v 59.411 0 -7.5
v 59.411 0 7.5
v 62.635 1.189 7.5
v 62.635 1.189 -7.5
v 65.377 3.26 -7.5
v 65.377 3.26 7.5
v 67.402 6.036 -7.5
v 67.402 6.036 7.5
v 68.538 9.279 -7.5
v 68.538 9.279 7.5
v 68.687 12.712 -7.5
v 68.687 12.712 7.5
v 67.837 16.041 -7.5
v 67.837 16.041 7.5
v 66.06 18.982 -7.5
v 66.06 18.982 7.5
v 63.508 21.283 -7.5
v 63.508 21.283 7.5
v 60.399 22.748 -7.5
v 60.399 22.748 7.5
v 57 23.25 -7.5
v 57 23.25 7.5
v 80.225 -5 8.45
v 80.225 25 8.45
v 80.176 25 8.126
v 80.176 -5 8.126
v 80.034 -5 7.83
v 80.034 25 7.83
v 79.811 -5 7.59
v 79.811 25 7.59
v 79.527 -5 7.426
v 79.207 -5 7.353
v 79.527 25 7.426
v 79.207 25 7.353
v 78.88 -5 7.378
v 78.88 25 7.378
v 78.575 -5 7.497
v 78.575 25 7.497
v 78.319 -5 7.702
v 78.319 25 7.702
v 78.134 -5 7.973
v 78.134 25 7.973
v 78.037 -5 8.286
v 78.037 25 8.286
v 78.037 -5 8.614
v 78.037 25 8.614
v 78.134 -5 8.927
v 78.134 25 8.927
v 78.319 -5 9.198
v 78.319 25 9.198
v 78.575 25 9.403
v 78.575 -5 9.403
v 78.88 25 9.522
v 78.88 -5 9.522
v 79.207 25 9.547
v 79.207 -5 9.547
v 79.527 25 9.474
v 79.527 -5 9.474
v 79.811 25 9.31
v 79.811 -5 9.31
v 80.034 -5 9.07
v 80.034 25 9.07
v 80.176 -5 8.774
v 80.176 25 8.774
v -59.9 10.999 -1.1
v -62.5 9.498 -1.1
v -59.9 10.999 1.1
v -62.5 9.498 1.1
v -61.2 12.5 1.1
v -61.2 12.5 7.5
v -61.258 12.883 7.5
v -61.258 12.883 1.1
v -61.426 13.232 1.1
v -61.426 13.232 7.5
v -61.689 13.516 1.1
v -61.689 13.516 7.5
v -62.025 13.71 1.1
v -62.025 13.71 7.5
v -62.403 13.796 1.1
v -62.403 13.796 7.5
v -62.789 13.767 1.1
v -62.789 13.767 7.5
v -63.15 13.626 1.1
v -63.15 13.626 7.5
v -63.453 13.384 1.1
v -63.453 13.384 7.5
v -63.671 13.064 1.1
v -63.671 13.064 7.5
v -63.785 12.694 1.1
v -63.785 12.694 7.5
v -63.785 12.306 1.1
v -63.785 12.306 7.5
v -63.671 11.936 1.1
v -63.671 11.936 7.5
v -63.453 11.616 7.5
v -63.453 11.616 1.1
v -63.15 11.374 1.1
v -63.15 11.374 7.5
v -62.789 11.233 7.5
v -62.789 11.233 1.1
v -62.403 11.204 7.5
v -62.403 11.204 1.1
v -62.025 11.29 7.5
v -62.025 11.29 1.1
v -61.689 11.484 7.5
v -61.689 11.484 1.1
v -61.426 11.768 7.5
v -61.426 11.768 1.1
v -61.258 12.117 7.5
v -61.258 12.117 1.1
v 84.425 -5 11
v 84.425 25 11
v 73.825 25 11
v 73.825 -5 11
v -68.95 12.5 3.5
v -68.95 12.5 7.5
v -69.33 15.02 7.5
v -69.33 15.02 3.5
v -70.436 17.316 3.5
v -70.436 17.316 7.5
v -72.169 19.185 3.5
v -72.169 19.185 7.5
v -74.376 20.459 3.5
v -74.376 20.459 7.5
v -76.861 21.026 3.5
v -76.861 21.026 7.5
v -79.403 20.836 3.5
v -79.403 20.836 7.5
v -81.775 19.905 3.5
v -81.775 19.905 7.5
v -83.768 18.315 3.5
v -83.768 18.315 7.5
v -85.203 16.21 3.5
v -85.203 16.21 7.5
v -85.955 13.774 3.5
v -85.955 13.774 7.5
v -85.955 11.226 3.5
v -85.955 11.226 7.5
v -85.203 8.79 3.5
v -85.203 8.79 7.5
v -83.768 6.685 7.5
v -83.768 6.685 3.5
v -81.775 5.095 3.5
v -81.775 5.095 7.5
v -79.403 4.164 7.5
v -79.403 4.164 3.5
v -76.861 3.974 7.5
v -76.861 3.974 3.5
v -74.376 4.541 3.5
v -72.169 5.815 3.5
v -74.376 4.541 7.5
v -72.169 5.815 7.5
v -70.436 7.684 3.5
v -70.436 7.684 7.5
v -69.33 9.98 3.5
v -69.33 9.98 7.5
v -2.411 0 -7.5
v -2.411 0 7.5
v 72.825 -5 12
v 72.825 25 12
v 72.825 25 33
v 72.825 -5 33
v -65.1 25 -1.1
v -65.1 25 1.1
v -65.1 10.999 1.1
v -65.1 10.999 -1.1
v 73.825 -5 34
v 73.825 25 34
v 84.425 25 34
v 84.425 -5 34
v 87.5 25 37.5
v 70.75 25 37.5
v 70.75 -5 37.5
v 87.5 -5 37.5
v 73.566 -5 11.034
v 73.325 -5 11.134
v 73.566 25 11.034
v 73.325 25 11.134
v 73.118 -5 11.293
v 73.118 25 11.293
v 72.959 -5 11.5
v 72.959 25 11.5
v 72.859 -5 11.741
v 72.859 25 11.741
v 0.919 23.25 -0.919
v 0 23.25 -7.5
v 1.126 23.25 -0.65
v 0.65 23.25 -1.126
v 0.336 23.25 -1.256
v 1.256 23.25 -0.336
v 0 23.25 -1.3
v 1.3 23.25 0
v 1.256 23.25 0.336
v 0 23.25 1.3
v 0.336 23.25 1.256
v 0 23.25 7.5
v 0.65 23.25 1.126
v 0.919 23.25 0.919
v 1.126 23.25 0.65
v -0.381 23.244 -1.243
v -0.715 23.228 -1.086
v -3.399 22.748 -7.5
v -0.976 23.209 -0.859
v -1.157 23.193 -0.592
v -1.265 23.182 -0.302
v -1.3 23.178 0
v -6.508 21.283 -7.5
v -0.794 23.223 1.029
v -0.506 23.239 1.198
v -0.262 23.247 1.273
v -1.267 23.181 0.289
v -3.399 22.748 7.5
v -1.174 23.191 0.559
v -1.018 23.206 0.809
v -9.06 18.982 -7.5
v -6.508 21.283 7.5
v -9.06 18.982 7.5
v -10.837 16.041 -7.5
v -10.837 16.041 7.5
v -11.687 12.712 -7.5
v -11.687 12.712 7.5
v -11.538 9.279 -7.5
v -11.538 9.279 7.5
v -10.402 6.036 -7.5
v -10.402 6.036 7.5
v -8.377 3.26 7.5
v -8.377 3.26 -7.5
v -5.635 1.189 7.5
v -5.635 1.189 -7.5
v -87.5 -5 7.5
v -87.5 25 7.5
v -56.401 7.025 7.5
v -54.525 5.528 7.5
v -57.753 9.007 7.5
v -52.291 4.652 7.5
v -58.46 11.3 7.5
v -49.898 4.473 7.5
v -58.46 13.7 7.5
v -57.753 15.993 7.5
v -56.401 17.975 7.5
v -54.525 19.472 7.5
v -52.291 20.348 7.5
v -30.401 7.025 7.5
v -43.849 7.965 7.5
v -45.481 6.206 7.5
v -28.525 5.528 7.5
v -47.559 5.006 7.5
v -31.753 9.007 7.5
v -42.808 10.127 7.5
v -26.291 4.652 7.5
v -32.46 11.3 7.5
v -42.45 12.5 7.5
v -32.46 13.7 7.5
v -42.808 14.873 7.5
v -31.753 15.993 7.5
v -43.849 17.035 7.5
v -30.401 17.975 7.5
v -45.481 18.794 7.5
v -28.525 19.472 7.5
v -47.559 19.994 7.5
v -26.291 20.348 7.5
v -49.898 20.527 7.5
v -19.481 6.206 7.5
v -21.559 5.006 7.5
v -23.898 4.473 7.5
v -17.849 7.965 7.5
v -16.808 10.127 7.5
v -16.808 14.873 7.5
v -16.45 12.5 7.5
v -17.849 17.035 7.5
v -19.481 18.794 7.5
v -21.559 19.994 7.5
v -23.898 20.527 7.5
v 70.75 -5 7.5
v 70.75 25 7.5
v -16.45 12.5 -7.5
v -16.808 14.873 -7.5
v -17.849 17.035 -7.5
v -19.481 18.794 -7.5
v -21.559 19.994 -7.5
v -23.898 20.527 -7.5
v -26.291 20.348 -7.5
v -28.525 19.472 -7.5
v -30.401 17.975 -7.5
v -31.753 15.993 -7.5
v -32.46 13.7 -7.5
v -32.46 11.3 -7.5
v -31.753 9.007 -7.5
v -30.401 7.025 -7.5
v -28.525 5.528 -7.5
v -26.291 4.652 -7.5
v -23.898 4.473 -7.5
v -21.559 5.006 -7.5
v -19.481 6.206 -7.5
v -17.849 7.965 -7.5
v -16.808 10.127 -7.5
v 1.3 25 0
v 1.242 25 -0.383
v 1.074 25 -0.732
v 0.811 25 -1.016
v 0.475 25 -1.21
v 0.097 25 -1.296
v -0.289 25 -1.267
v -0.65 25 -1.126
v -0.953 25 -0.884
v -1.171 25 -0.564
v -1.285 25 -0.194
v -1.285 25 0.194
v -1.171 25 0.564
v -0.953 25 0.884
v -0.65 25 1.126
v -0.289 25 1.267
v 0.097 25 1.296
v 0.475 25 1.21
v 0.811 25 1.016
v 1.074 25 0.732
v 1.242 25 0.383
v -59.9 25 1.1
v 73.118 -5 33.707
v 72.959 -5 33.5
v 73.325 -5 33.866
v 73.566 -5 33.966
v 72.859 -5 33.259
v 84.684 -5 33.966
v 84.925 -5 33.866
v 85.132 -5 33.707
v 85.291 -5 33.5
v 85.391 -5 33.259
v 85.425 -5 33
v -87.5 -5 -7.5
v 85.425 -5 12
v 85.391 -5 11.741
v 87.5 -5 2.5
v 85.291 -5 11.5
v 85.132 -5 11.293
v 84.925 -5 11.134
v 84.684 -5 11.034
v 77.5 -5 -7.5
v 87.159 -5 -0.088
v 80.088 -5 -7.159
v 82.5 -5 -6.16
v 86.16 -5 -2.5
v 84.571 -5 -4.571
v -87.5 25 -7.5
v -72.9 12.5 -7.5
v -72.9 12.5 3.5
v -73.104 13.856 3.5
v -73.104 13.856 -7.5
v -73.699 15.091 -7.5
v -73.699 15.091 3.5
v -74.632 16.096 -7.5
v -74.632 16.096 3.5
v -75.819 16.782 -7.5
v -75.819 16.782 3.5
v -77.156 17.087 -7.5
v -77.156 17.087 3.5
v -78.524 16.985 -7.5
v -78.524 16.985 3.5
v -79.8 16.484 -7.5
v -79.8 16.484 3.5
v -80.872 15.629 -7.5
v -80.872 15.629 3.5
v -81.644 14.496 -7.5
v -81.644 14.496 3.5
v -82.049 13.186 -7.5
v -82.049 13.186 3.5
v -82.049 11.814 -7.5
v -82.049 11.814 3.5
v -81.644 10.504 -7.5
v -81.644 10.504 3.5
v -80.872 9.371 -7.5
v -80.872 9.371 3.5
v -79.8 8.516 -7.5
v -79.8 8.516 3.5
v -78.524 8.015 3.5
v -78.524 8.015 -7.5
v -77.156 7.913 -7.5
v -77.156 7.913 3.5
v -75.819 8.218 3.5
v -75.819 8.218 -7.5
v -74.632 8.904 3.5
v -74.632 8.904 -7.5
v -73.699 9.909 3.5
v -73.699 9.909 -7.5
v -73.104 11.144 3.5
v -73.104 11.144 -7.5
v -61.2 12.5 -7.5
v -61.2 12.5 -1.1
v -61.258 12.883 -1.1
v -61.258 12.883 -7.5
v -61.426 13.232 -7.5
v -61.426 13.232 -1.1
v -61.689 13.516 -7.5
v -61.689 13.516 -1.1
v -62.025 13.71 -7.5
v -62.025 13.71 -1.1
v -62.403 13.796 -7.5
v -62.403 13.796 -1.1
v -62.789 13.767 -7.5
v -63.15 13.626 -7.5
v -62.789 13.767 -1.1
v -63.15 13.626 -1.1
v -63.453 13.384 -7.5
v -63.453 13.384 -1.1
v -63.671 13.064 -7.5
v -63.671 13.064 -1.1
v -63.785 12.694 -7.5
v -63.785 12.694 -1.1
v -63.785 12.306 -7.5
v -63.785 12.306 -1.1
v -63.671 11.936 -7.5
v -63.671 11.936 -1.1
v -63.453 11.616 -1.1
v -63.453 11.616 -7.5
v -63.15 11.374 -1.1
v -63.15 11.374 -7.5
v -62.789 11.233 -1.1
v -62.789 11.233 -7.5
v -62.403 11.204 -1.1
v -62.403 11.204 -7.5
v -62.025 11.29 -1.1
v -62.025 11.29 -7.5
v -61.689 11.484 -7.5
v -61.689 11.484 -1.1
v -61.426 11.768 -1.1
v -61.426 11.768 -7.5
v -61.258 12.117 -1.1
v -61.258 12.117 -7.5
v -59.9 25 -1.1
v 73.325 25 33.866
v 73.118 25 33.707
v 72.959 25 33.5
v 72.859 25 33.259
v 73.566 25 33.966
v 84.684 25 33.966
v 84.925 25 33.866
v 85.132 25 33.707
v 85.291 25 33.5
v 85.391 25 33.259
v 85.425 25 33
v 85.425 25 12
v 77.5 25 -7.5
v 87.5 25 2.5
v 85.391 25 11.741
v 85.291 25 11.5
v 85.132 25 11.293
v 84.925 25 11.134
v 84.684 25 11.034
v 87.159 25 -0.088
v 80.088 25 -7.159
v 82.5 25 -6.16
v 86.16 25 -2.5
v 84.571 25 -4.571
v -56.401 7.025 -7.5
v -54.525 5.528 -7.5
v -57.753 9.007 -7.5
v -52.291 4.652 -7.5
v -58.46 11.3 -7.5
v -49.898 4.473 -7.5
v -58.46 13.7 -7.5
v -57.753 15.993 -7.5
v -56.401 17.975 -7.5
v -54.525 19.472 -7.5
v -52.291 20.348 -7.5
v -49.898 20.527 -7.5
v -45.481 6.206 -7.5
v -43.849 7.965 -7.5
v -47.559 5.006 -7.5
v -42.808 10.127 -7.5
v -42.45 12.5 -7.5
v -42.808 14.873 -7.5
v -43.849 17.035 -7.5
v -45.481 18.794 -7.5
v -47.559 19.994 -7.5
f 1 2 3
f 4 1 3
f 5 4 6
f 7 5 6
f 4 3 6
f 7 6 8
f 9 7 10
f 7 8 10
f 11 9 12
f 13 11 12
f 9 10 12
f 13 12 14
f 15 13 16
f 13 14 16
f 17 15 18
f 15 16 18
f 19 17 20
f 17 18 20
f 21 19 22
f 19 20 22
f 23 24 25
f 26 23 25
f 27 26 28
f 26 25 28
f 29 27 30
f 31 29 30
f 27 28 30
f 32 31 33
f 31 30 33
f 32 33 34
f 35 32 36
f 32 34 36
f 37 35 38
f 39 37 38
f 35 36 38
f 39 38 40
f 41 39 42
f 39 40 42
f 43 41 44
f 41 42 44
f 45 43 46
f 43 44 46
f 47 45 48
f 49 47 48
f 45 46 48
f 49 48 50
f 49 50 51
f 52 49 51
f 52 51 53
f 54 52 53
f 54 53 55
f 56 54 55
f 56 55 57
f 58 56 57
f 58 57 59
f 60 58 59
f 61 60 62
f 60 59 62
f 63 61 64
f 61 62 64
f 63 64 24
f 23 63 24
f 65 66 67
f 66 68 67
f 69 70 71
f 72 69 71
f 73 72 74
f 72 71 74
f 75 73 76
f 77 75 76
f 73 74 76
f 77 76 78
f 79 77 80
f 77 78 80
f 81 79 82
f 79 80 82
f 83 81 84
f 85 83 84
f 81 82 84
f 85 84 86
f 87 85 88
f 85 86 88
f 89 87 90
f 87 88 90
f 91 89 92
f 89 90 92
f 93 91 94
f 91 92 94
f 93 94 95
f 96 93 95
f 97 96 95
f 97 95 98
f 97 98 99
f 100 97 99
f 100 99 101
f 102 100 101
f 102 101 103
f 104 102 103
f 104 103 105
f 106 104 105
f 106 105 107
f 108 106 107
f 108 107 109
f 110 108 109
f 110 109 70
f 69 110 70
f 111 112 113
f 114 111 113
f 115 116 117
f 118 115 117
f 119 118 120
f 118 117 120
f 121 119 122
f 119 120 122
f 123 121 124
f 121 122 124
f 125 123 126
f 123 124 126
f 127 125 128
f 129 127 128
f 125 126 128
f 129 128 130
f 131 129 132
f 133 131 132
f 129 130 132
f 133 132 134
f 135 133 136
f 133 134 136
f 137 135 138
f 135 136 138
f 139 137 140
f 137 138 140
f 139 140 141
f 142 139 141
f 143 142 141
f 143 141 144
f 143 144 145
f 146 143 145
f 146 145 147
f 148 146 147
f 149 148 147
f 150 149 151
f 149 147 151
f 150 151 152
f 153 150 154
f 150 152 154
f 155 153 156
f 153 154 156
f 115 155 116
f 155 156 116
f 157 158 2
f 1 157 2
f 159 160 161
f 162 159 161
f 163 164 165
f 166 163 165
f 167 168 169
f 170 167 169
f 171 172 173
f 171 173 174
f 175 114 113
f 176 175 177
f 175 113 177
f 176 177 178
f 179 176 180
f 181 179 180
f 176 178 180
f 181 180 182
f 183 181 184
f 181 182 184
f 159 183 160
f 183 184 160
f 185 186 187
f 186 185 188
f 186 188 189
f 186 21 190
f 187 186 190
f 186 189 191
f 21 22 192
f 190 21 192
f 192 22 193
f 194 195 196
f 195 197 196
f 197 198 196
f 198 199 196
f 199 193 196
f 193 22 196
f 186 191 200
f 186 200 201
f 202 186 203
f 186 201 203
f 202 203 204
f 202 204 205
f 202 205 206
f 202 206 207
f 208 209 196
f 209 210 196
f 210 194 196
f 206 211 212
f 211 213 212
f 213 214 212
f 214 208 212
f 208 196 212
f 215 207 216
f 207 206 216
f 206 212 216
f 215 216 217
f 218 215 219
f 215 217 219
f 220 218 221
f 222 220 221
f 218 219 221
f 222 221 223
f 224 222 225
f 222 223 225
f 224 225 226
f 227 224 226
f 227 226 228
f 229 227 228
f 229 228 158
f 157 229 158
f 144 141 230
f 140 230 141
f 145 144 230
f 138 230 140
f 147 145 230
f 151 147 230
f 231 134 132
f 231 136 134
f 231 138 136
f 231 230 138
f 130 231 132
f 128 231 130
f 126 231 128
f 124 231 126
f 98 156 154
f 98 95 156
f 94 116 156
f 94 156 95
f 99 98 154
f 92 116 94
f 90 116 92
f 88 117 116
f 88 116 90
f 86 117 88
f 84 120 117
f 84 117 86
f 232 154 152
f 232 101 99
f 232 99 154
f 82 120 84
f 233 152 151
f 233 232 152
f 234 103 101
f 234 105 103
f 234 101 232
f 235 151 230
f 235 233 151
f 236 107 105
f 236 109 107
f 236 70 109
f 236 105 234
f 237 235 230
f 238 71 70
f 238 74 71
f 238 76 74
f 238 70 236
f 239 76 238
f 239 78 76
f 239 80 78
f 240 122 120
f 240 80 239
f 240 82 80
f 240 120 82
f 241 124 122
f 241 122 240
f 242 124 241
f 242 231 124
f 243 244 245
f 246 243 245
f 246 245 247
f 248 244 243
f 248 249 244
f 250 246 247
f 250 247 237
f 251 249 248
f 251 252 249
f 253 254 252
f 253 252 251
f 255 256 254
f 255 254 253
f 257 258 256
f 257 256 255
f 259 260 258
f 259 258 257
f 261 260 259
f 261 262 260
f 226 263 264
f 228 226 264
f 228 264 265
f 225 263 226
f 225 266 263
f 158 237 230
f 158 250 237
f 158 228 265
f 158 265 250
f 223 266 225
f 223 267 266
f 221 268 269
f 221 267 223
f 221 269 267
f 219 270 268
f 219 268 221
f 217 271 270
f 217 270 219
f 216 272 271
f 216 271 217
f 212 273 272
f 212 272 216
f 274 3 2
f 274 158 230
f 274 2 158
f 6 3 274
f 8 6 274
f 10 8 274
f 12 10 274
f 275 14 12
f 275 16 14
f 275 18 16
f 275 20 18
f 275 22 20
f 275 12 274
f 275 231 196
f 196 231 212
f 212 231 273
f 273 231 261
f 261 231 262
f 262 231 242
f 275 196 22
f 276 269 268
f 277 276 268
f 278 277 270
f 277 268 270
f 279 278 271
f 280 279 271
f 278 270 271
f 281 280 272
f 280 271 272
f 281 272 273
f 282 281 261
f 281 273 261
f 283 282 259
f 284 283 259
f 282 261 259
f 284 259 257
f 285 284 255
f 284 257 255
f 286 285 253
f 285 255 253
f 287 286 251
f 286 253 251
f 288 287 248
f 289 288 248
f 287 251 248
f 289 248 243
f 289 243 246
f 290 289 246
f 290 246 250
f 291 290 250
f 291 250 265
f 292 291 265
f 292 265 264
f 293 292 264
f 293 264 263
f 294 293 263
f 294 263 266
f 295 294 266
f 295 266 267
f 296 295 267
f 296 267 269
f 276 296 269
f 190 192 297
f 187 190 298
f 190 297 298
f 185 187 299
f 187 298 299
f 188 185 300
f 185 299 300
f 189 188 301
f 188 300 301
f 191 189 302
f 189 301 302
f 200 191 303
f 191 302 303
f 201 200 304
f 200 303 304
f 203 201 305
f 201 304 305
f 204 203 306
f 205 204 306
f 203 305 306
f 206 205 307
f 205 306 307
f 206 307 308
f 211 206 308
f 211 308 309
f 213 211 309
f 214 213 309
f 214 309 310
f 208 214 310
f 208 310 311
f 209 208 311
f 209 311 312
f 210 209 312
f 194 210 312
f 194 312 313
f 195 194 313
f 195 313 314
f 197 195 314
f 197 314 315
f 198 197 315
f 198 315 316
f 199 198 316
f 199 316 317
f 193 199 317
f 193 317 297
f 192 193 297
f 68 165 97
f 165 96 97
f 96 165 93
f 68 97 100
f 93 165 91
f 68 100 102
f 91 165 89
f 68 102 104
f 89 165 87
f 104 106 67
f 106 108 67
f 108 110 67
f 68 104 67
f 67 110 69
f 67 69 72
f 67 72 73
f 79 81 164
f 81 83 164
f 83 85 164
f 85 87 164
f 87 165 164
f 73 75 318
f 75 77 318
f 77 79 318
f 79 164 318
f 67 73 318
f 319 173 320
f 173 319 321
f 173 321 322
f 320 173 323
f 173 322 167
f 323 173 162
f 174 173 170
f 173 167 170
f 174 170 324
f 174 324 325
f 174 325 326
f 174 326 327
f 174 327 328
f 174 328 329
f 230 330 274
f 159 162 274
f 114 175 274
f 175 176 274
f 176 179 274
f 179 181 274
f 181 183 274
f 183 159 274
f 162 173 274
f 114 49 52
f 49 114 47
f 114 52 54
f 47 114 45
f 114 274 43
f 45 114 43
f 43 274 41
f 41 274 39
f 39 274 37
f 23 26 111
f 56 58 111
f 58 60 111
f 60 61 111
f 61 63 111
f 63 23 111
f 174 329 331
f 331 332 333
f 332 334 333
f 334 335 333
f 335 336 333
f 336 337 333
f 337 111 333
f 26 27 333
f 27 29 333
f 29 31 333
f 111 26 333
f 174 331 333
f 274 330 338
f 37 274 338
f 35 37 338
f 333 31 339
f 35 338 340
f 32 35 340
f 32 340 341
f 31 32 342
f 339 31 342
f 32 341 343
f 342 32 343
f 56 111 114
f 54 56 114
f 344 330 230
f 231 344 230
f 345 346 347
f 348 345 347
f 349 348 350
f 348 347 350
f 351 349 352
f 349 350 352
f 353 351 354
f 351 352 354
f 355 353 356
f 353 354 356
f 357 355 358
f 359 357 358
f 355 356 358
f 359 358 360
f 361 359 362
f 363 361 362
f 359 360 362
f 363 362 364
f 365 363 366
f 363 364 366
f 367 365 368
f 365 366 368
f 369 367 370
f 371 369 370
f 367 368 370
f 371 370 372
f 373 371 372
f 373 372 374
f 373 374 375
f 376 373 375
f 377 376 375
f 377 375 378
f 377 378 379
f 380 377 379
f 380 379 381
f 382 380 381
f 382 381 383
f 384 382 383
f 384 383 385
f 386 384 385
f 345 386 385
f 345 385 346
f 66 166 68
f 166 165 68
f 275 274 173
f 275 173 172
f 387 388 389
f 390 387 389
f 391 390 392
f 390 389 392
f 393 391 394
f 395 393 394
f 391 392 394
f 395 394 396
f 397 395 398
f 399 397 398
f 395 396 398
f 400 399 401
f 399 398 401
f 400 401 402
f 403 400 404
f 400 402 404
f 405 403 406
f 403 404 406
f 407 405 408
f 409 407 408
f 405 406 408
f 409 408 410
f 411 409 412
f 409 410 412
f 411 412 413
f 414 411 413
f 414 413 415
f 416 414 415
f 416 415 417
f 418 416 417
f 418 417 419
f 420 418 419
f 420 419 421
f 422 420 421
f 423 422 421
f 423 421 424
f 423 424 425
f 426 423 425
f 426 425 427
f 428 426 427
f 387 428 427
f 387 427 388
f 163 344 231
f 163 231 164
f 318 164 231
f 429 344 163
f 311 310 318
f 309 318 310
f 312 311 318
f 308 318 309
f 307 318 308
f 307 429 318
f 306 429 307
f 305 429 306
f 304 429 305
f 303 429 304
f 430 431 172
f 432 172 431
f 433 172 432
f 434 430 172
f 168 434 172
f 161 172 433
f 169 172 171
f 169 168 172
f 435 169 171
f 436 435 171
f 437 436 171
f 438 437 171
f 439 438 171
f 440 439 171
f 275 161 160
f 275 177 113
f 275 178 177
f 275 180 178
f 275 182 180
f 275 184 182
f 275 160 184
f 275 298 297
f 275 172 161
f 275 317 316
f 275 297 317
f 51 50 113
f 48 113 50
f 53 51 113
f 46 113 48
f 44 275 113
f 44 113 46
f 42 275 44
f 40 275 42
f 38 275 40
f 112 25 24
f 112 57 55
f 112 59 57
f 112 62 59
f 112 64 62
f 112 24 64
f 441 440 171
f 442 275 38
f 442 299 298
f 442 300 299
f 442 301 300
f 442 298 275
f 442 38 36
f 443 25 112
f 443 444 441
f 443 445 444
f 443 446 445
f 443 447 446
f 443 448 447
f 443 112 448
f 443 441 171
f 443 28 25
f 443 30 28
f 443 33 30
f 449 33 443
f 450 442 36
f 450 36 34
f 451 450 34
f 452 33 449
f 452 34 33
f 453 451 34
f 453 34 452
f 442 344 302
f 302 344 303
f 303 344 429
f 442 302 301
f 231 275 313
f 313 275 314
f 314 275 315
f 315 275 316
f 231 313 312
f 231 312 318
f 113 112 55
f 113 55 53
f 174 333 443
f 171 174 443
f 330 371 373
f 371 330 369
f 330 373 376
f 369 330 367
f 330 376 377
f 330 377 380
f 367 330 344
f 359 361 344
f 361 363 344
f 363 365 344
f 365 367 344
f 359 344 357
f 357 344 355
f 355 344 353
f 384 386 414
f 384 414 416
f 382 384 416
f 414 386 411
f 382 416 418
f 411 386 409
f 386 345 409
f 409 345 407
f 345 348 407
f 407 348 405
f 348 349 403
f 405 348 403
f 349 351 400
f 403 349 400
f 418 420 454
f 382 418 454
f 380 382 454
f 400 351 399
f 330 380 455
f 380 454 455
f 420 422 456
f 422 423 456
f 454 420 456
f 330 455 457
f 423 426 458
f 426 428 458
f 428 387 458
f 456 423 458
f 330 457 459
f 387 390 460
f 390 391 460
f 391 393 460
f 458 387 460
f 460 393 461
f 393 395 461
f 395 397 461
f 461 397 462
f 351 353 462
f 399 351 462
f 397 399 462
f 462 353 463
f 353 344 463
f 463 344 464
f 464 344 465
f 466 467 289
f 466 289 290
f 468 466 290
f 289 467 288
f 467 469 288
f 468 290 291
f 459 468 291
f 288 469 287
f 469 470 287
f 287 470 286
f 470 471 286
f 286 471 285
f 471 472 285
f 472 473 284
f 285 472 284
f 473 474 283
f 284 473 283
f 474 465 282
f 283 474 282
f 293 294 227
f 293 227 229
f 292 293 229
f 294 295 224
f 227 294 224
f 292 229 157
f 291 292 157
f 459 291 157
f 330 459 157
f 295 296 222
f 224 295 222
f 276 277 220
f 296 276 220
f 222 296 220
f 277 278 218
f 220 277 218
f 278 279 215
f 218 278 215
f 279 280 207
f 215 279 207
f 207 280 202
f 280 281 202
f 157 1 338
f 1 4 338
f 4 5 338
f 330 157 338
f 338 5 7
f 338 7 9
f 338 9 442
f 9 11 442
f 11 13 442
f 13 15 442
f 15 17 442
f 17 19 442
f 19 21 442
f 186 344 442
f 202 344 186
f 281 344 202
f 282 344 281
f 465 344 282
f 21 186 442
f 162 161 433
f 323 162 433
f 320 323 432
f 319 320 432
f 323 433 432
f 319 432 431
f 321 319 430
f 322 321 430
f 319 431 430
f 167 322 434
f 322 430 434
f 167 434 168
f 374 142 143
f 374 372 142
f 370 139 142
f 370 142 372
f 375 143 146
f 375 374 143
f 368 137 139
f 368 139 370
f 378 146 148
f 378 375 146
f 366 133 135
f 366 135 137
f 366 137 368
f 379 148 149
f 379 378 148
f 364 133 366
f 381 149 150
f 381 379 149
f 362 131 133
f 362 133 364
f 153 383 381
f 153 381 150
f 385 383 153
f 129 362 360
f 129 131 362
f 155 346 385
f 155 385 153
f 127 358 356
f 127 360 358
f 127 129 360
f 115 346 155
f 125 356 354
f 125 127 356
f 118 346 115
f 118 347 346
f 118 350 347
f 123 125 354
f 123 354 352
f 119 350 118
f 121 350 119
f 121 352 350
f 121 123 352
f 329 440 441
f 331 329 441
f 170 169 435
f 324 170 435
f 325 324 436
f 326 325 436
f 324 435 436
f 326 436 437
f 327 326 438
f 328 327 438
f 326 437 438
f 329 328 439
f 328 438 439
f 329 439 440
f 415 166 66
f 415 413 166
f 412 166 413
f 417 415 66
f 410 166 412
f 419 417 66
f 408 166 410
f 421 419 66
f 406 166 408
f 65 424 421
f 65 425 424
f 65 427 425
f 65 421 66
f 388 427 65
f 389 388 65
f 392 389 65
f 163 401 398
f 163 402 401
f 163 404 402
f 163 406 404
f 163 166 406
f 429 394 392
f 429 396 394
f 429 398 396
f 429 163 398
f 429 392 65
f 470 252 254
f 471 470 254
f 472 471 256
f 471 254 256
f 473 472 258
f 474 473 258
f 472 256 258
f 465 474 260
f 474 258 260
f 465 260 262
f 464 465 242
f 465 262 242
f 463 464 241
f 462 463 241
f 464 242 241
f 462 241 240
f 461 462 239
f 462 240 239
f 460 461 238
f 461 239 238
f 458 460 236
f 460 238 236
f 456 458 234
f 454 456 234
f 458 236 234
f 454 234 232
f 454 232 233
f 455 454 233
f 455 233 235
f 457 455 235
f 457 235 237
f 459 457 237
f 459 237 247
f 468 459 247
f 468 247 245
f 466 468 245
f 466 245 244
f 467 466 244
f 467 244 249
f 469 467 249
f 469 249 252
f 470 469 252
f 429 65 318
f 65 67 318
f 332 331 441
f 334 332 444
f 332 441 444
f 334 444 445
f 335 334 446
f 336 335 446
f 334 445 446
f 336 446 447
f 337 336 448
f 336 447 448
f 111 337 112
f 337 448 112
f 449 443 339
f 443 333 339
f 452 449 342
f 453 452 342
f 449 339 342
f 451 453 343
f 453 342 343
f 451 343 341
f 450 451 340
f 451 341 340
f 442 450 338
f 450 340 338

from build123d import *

# Parameters (mm, degrees)
SKETCH1_W           = 175
SKETCH1_H           = 15
BOSS_EXTRUDE1_DEPTH = 25
CUT_EXTRUDE1_REACH  = 17
SKETCH3_R           = 4.6
SKETCH3_R_2         = 8.05
SKETCH3_R_3         = 1.3
SKETCH3_3_R         = 8.55
SKETCH3_3_R_2       = 4.6
CUT_EXTRUDE2_DEPTH  = 4
CUT_EXTRUDE3_DEPTH  = 1.1
CUT_EXTRUDE4_REACH  = 27
SKETCH5_R           = 1.3
CUT_EXTRUDE6_REACH  = 17
SKETCH8_W           = 175
SKETCH8_H           = 15
BOSS_EXTRUDE2_DEPTH = 5
SKETCH9_W           = 16.75
SKETCH9_H           = 30
BOSS_EXTRUDE3_DEPTH = 30
SKETCH10_R          = 1.1
CUT_EXTRUDE7_DEPTH  = 30
FILLET1_R           = 10


with BuildPart() as part:
    # Sketch1 → Boss-Extrude1 (new body)
    with BuildSketch(Plane(origin=(0, 0, 0), x_dir=(1, 0, 0), z_dir=(0, 1, 0))):
        Rectangle(SKETCH1_W, SKETCH1_H)
    extrude(amount=BOSS_EXTRUDE1_DEPTH)

    # Sketch3 → Cut-Extrude1 (cut, up to next)
    with BuildSketch(Plane.XY.offset(7.5), mode=Mode.PRIVATE) as cut_extrude1_sk1:
        with Locations((-77.5, 12.5)):
            Circle(SKETCH3_R)
    cut_extrude1_tool1 = extrude(cut_extrude1_sk1.sketch, amount=-CUT_EXTRUDE1_REACH, mode=Mode.PRIVATE) & part.part
    add(cut_extrude1_tool1.solids().sort_by_distance((-77.5, 12.5, 7.5))[0], mode=Mode.SUBTRACT)
    # Sketch3 → Cut-Extrude1 (cut, up to next)
    with BuildSketch(Plane.XY.offset(7.5), mode=Mode.PRIVATE) as cut_extrude1_sk2:
        with Locations((-50.5, 12.5)):
            Circle(SKETCH3_R_2)
    cut_extrude1_tool2 = extrude(cut_extrude1_sk2.sketch, amount=-CUT_EXTRUDE1_REACH, mode=Mode.PRIVATE) & part.part
    add(cut_extrude1_tool2.solids().sort_by_distance((-50.5, 12.5, 7.5))[0], mode=Mode.SUBTRACT)
    # Sketch3 → Cut-Extrude1 (cut, up to next)
    with BuildSketch(Plane.XY.offset(7.5), mode=Mode.PRIVATE) as cut_extrude1_sk3:
        with Locations((-24.5, 12.5)):
            Circle(SKETCH3_R_2)
    cut_extrude1_tool3 = extrude(cut_extrude1_sk3.sketch, amount=-CUT_EXTRUDE1_REACH, mode=Mode.PRIVATE) & part.part
    add(cut_extrude1_tool3.solids().sort_by_distance((-24.5, 12.5, 7.5))[0], mode=Mode.SUBTRACT)
    # Sketch3 → Cut-Extrude1 (cut, up to next)
    with BuildSketch(Plane.XY.offset(7.5), mode=Mode.PRIVATE) as cut_extrude1_sk4:
        with Locations((-62.5, 12.5)):
            Circle(SKETCH3_R_3)
    cut_extrude1_tool4 = extrude(cut_extrude1_sk4.sketch, amount=-CUT_EXTRUDE1_REACH, mode=Mode.PRIVATE) & part.part
    add(cut_extrude1_tool4.solids().sort_by_distance((-62.5, 12.5, 7.5))[0], mode=Mode.SUBTRACT)

    # Sketch3<3> → Cut-Extrude2 (cut)
    with BuildSketch(Plane.XY.offset(7.5)):
        with Locations((-77.5, 12.5)):
            Circle(SKETCH3_3_R)
        with Locations((-77.5, 12.5)):
            Circle(SKETCH3_3_R_2, mode=Mode.SUBTRACT)
    extrude(amount=-CUT_EXTRUDE2_DEPTH, mode=Mode.SUBTRACT)

    # Sketch4 → Cut-Extrude3 (cut, symmetric)
    with BuildSketch(Plane.XY):
        Polygon((-59.9, 10.9988893), (-59.9, 14.0011107), (-62.5, 15.5022214), (-65.1, 14.0011107), (-65.1, 10.9988893), (-62.5, 9.4977786), align=None)
        Polygon((-59.9, 25), (-59.9, 14.0011107), (-62.5, 15.5022214), (-65.1, 14.0011107), (-65.1, 25), align=None)
    extrude(amount=CUT_EXTRUDE3_DEPTH, both=True, mode=Mode.SUBTRACT)

    # Sketch5 → Cut-Extrude4 (cut, up to next)
    with BuildSketch(Plane(origin=(0, 25, 0), x_dir=(1, 0, 0), z_dir=(0, 1, 0)), mode=Mode.PRIVATE) as cut_extrude4_sk1:
        Circle(SKETCH5_R)
    cut_extrude4_tool1 = extrude(cut_extrude4_sk1.sketch, amount=-CUT_EXTRUDE4_REACH, mode=Mode.PRIVATE) & part.part
    add(cut_extrude4_tool1.solids().sort_by_distance((0, 25, 0))[0], mode=Mode.SUBTRACT)

    # Sketch6 → Cut-Extrude6 (cut, up to next)
    with BuildSketch(Plane.XY.offset(7.5), mode=Mode.PRIVATE) as cut_extrude6_sk1:
        with BuildLine():
            Line((57, 23), (0, 23))
            ThreePointArc((0, 23), (-11.5, 11.5), (0, 0))
            Line((0, 0), (57, 0))
            ThreePointArc((57, 0), (68.5, 11.5), (57, 23))
        make_face()
    cut_extrude6_tool1 = extrude(cut_extrude6_sk1.sketch, amount=-CUT_EXTRUDE6_REACH, mode=Mode.PRIVATE) & part.part
    add(cut_extrude6_tool1.solids().sort_by_distance((28.5, 11.5, 7.5))[0], mode=Mode.SUBTRACT)
    # Sketch6 → Cut-Extrude6 (cut, up to next)
    with BuildSketch(Plane.XY.offset(7.5), mode=Mode.PRIVATE) as cut_extrude6_sk2:
        with BuildLine():
            ThreePointArc((0, 0), (-11.5, 11.5), (0, 23))
            Line((0, 23), (57, 23))
            ThreePointArc((57, 23), (68.5, 11.5), (57, 0))
            Line((57, 0), (59.41091269, 0))
            ThreePointArc((59.41091269, 0), (68.687332887, 12.711919964), (57, 23.25))
            Line((57, 23.25), (0, 23.25))
            ThreePointArc((0, 23.25), (-11.687332887, 12.711919964), (-2.41091269, 0))
            Line((-2.41091269, 0), (0, 0))
        make_face()
    cut_extrude6_tool2 = extrude(cut_extrude6_sk2.sketch, amount=-CUT_EXTRUDE6_REACH, mode=Mode.PRIVATE) & part.part
    add(cut_extrude6_tool2.solids().sort_by_distance((68.603989, 12.703278, 7.5))[0], mode=Mode.SUBTRACT)

    # Sketch8 → Boss-Extrude2 (add)
    with BuildSketch(Plane.XZ):
        Rectangle(SKETCH8_W, SKETCH8_H)
    extrude(amount=BOSS_EXTRUDE2_DEPTH)

    # Sketch9 → Boss-Extrude3 (add)
    with BuildSketch(Plane.XY.offset(7.5)):
        with Locations((79.125, 10)):
            Rectangle(SKETCH9_W, SKETCH9_H)
    extrude(amount=BOSS_EXTRUDE3_DEPTH)

    # Sketch10 → Cut-Extrude7 (cut)
    with BuildSketch(Plane(origin=(0, 25, 0), x_dir=(1, 0, 0), z_dir=(0, 1, 0))):
        with Locations((79.125, -8.45)):
            Circle(SKETCH10_R)
        with BuildLine():
            Line((73.825, -34), (84.425, -34))
            ThreePointArc((84.425, -34), (85.132106781, -33.707106781), (85.425, -33))
            Line((85.425, -33), (85.425, -12))
            ThreePointArc((85.425, -12), (85.132106781, -11.292893219), (84.425, -11))
            Line((84.425, -11), (73.825, -11))
            ThreePointArc((73.825, -11), (73.117893219, -11.292893219), (72.825, -12))
            Line((72.825, -12), (72.825, -33))
            ThreePointArc((72.825, -33), (73.117893219, -33.707106781), (73.825, -34))
        make_face()
    extrude(amount=-CUT_EXTRUDE7_DEPTH, mode=Mode.SUBTRACT)

    # Fillet1
    fillet1_edges = [part.edges().sort_by_distance(p)[0] for p in [
        (87.5, 10, -7.5),
    ]]
    fillet(fillet1_edges, radius=FILLET1_R)


solid = part.part
